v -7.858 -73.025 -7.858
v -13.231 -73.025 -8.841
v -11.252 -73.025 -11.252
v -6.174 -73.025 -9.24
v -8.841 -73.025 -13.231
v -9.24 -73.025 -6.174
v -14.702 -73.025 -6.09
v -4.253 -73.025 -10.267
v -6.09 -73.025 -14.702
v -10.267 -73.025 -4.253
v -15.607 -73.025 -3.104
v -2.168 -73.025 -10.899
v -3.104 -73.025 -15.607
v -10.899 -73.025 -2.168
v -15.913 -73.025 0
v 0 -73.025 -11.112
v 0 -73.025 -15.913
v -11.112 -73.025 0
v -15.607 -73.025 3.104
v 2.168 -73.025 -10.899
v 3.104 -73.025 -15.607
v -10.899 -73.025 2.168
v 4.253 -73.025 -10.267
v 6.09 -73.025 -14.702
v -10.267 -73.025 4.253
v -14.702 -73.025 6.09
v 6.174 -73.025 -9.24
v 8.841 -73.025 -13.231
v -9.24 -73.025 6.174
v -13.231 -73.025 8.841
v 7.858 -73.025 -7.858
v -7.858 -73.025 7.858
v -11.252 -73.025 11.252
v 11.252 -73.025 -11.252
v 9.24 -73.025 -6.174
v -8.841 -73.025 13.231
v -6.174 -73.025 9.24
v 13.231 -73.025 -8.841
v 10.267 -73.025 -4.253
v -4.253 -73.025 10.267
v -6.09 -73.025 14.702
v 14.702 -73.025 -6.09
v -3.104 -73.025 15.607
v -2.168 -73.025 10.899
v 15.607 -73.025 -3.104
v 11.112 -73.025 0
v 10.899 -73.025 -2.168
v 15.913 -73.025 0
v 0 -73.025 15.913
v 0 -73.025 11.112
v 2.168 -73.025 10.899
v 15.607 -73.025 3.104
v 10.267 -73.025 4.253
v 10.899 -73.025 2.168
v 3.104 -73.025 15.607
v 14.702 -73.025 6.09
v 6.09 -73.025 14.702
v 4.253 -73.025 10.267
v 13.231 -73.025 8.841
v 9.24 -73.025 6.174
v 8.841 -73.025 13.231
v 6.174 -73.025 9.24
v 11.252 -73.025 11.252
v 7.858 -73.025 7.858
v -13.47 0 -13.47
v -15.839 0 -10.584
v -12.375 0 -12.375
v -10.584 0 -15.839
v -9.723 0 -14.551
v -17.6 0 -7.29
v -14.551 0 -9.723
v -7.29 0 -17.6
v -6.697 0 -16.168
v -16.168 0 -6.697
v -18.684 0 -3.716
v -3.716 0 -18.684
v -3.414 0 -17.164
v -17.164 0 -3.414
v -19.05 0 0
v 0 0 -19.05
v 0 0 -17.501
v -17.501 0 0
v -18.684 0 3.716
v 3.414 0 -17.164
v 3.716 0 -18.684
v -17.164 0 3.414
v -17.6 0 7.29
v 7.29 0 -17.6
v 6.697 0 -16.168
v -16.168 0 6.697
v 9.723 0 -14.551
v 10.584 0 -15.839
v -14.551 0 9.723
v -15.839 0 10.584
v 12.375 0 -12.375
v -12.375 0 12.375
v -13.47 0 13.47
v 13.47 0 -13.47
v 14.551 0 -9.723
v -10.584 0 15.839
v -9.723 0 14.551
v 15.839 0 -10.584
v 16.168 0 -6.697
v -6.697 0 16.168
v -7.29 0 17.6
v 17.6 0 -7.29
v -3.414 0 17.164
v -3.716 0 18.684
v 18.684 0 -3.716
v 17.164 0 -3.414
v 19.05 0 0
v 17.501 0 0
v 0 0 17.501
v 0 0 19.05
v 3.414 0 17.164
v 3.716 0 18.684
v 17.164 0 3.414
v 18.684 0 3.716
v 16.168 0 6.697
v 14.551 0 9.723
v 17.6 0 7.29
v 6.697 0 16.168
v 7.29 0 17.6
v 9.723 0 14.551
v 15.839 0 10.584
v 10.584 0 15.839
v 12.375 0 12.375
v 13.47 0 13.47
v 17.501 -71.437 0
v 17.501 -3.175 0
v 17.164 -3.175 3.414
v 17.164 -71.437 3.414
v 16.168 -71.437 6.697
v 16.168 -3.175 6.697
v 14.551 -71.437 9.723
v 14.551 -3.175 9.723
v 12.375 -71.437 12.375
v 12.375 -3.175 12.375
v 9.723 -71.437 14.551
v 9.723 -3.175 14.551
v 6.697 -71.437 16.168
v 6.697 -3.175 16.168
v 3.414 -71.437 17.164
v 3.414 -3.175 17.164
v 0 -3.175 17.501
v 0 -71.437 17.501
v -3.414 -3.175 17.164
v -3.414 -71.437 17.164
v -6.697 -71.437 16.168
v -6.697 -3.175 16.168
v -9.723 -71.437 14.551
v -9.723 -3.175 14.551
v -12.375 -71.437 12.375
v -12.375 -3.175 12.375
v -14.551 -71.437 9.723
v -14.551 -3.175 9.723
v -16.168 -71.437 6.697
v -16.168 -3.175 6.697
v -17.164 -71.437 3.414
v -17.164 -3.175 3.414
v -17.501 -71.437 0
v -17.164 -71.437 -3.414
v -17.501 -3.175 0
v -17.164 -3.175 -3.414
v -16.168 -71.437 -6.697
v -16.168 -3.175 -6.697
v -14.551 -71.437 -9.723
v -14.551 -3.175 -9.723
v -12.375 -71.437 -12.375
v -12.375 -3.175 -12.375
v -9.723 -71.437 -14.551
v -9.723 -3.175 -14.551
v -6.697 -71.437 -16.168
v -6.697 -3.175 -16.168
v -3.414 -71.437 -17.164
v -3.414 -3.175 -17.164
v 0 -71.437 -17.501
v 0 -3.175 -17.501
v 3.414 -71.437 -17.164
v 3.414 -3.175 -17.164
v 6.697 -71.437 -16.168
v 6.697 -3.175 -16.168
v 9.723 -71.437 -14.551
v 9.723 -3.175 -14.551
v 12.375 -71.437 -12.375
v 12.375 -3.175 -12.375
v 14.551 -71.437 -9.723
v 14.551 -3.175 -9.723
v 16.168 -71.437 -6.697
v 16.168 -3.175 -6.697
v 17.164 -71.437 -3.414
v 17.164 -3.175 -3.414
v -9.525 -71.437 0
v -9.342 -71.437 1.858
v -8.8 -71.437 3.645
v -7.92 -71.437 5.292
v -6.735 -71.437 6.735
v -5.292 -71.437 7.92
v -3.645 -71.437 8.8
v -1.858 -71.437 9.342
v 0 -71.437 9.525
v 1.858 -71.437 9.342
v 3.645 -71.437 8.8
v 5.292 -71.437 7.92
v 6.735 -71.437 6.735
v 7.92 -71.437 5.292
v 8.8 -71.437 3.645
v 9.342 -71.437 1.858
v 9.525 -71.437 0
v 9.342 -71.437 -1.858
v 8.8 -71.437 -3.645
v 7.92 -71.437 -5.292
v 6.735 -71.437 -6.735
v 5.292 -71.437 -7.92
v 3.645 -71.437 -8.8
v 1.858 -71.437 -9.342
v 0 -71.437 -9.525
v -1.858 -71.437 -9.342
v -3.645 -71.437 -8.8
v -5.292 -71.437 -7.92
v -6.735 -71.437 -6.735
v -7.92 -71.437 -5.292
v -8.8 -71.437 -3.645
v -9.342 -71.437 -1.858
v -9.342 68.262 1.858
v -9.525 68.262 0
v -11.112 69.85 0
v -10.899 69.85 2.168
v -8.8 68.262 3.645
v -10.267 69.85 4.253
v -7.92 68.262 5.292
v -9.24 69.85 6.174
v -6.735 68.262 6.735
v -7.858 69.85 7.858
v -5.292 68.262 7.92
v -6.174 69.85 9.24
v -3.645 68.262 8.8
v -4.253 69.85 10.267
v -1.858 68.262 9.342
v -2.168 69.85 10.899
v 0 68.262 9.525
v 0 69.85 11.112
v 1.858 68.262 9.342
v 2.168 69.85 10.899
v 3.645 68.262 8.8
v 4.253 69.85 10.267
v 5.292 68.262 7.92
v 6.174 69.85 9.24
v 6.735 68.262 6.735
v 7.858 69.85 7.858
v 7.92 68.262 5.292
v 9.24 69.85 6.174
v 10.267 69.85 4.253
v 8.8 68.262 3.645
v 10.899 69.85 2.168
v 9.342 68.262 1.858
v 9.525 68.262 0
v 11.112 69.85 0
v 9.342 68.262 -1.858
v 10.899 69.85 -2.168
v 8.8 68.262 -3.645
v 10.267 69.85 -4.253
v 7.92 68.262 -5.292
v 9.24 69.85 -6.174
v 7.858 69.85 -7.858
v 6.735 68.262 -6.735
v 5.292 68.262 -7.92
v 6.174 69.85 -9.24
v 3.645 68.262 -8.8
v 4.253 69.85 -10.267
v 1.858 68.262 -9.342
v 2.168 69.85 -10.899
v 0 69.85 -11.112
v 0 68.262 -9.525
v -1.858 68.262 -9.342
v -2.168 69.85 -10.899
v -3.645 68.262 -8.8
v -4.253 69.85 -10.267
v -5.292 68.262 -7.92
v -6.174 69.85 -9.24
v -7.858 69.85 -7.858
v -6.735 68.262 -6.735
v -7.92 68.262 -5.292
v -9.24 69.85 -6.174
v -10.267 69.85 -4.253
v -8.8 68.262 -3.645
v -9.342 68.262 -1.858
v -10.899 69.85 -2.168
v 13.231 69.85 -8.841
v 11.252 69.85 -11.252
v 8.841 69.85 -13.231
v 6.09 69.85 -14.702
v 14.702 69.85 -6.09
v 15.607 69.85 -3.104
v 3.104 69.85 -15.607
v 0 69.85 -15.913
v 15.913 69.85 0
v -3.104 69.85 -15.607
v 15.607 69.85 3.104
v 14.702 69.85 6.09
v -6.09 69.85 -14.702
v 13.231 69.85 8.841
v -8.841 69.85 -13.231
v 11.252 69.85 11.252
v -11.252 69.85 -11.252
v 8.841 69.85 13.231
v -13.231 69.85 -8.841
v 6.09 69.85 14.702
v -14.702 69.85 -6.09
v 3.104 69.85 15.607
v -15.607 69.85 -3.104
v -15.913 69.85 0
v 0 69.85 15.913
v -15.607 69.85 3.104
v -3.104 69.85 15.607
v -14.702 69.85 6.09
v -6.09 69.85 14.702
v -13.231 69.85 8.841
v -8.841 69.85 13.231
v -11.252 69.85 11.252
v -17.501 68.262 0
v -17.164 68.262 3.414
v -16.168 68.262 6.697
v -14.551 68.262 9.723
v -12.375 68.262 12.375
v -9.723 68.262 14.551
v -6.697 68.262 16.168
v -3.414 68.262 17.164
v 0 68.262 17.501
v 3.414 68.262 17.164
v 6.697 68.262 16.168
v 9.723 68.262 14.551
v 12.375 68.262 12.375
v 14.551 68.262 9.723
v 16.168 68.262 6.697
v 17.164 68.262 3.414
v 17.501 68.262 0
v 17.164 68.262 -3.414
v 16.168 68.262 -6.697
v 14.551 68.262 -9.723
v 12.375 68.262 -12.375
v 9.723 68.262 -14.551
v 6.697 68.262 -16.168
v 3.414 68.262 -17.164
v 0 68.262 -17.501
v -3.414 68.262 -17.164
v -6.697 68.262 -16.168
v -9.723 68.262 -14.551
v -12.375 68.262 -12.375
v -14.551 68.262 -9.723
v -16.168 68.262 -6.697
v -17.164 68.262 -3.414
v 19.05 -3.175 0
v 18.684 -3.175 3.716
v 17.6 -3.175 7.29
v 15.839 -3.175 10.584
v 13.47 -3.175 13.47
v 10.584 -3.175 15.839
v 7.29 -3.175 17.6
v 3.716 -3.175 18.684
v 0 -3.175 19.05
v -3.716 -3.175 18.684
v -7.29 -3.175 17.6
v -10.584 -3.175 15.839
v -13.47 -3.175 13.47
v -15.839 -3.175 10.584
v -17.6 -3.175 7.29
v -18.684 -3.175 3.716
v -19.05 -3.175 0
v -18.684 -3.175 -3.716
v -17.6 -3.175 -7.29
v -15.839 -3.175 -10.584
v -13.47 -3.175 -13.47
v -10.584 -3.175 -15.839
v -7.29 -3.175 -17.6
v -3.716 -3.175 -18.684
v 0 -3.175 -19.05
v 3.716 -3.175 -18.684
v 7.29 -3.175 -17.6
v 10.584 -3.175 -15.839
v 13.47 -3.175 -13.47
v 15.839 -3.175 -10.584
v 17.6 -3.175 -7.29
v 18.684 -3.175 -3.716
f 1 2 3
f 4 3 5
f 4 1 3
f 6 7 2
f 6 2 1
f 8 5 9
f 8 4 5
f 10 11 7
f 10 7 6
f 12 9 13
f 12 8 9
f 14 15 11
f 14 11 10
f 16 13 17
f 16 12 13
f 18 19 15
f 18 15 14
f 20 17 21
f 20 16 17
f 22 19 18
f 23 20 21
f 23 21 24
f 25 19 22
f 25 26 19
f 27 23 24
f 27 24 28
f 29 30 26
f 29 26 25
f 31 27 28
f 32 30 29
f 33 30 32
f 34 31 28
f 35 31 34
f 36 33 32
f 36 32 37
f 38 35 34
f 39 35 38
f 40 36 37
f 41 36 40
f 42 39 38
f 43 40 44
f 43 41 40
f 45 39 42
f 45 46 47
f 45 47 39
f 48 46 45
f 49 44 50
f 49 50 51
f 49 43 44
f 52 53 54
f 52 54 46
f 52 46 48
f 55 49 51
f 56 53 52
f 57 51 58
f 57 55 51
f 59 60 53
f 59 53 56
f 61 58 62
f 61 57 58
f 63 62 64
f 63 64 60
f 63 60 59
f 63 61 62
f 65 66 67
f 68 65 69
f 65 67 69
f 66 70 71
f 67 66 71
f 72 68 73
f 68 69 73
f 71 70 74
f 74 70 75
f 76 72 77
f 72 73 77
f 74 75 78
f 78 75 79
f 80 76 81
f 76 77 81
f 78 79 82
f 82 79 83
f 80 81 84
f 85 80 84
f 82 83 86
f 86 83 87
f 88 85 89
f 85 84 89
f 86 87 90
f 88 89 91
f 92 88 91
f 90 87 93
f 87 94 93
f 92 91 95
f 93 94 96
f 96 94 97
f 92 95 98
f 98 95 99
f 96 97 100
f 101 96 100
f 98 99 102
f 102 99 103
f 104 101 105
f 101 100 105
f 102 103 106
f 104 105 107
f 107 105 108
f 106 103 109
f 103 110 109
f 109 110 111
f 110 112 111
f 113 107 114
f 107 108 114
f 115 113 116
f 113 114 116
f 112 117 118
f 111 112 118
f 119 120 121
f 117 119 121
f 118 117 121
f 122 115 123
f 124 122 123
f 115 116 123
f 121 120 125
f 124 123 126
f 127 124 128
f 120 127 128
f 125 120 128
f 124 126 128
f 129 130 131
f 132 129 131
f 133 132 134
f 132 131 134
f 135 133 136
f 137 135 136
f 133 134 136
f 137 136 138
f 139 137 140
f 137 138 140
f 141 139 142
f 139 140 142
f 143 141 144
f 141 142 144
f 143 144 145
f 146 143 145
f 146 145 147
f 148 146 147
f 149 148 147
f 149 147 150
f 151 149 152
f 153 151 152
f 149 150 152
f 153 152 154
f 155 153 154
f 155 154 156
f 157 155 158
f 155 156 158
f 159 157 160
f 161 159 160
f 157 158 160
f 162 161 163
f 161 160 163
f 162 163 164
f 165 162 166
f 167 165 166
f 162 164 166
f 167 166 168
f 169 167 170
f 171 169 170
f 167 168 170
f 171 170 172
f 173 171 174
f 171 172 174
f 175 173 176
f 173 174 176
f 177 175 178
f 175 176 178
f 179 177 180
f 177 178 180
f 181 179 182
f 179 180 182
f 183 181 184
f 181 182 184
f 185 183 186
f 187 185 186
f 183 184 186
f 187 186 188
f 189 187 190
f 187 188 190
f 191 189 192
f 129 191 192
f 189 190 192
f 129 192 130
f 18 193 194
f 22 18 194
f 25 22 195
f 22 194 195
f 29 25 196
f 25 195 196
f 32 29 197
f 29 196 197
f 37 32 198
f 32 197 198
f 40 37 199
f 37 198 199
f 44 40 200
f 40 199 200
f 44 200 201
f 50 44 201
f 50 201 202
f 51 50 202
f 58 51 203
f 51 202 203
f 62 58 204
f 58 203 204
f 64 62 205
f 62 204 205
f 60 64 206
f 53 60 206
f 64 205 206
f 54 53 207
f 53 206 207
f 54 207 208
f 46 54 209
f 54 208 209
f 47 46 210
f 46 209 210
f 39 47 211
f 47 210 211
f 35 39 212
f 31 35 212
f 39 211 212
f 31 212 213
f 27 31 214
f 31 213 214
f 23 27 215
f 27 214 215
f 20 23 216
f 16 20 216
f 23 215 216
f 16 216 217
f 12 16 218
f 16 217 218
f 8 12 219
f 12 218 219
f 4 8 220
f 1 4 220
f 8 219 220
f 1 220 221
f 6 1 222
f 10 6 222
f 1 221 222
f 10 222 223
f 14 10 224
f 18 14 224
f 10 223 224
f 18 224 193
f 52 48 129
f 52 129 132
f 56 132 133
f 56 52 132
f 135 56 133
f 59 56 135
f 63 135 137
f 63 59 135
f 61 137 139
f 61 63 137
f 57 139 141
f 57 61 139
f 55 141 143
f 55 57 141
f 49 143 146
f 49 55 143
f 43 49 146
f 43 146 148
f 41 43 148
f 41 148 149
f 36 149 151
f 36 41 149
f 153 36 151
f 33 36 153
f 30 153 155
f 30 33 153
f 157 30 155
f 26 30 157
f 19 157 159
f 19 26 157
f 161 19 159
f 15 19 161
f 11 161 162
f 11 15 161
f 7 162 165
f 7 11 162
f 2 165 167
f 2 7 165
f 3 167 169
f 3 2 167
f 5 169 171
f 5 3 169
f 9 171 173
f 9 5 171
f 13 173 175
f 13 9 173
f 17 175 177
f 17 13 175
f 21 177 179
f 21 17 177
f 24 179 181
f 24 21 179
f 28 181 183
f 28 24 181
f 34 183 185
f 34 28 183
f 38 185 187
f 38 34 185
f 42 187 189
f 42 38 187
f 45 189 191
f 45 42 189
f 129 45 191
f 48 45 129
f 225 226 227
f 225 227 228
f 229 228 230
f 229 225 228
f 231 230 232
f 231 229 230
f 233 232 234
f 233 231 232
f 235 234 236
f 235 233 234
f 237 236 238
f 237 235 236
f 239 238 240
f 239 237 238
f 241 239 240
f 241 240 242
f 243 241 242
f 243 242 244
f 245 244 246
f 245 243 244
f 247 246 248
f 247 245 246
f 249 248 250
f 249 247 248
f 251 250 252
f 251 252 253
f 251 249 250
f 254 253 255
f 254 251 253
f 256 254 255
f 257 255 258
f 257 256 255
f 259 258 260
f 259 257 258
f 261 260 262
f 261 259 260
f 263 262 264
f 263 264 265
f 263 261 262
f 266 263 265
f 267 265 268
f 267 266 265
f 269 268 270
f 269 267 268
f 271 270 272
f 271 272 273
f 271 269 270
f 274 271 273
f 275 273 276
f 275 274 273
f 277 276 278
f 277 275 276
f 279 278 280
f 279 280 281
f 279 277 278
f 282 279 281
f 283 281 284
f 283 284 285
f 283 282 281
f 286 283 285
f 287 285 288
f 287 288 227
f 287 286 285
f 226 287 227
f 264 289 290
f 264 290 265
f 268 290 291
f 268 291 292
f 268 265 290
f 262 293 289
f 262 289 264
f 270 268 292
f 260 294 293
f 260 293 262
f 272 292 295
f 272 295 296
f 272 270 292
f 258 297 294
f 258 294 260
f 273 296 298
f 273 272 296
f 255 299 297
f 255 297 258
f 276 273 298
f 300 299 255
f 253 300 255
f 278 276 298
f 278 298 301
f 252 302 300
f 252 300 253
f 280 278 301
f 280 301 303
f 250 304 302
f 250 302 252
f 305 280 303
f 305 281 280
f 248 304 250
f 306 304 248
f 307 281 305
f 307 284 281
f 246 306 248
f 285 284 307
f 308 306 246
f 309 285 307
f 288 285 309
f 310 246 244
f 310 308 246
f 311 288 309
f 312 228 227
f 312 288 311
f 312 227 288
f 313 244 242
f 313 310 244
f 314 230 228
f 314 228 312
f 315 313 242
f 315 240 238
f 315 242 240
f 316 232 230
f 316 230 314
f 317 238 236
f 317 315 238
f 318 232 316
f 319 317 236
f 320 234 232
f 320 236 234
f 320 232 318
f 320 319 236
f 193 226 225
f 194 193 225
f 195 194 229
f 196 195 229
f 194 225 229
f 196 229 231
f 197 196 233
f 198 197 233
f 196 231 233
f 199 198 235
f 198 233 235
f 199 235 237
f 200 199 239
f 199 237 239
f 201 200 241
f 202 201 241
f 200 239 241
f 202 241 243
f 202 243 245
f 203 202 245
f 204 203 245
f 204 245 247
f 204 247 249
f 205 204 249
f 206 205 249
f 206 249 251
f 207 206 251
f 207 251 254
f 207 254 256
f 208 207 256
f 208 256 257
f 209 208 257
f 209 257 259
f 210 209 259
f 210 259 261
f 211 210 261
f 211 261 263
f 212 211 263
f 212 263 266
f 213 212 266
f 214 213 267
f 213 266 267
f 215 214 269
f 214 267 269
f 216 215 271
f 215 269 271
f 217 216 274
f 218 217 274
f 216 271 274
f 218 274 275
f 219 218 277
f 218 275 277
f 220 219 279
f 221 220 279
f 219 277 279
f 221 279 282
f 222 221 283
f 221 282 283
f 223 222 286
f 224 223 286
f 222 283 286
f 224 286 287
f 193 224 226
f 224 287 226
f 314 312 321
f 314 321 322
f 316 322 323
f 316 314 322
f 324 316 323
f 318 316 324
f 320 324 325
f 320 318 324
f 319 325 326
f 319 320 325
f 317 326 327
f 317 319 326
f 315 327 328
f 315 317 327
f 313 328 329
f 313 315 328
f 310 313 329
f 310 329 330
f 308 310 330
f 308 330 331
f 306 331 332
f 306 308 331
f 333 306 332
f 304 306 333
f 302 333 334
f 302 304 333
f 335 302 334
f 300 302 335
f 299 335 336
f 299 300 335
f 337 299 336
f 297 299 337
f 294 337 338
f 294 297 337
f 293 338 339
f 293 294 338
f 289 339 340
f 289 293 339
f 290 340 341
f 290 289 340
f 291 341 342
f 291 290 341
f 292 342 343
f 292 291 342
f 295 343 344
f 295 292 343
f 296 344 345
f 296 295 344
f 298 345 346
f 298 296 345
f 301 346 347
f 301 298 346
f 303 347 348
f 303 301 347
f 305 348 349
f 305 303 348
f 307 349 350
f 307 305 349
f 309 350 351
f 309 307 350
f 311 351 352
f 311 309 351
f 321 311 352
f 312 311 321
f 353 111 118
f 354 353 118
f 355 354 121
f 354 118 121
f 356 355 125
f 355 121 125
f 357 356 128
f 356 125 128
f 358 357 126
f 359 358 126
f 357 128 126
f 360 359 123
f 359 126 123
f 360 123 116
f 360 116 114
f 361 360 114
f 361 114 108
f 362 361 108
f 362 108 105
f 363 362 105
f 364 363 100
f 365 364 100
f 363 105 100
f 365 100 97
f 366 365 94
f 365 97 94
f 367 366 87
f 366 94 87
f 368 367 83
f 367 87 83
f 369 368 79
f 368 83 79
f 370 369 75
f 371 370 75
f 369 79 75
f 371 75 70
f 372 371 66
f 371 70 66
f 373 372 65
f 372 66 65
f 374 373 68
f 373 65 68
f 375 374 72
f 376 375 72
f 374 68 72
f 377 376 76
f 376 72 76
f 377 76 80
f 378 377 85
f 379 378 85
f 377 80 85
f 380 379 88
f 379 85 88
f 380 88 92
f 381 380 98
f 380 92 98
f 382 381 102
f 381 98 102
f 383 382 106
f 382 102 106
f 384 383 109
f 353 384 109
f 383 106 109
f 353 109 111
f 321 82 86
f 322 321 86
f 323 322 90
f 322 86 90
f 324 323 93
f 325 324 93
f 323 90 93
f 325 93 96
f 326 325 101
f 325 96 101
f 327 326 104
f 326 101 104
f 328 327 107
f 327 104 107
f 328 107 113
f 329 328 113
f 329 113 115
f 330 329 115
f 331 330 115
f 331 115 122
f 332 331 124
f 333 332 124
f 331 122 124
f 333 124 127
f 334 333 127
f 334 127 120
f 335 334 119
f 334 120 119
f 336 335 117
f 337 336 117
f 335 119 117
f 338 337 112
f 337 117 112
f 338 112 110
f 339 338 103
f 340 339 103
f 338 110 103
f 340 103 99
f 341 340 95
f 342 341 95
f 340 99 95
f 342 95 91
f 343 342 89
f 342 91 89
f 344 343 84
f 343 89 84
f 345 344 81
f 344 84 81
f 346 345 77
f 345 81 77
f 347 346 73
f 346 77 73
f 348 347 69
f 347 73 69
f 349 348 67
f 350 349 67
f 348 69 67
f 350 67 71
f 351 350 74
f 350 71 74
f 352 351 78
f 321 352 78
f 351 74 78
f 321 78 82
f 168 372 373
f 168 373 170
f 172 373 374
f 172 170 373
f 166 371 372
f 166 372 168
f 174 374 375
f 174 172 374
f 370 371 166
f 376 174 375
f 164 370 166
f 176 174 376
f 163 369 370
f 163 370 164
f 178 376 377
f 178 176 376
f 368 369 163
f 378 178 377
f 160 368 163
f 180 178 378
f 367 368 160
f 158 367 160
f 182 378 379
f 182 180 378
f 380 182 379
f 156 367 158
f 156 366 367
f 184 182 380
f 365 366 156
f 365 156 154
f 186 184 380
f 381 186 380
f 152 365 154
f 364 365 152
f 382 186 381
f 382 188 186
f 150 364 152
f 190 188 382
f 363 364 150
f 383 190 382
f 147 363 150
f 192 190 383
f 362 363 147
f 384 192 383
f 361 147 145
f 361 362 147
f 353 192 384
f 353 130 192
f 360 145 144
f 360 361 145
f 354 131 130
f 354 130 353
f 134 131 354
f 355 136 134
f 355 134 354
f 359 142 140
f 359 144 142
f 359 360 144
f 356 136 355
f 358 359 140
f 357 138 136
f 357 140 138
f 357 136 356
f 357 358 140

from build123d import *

# Parameters (mm, degrees)
F0_R     = 19.05
F1_DEPTH = 3.175
F2_R     = 17.5006
F3_DEPTH = 69.85
F4_R     = 17.5006
F5_DEPTH = 69.85
F6_R     = 9.525
F7_DEPTH = 142.876
F8_SIZE  = 1.5875


with BuildPart() as f1:
    # F0 (on Front) → F1 (new body)
    with BuildSketch(Plane.XZ):
        Circle(F0_R)
    extrude(amount=F1_DEPTH)

    # F2 (on face) → F3 (join)
    with BuildSketch(Plane.XZ.offset(3.175)):
        Circle(F2_R)
    extrude(amount=F3_DEPTH)

    # F4 (on face) → F5 (join)
    with BuildSketch(Plane(origin=(0, 0, 0), x_dir=(-1, 0, 0), z_dir=(0, 1, 0))):
        Circle(F4_R)
    extrude(amount=F5_DEPTH)

    # F6 (on face) → F7 (cut, through all)
    with BuildSketch(Plane(origin=(0, 69.85, 0), x_dir=(-1, 0, 0), z_dir=(0, 1, 0))):
        Circle(F6_R)
    extrude(amount=-F7_DEPTH, mode=Mode.SUBTRACT)

    # F8
    f8_edges = [f1.edges().sort_by_distance(p)[0] for p in [
        (-17.5006, -73.025, 0),
        (9.525, -73.025, 0),
        (9.525, 69.85, 0),
        (17.5006, 69.85, 0),
    ]]
    chamfer(f8_edges, length=F8_SIZE)


solid = f1.part
